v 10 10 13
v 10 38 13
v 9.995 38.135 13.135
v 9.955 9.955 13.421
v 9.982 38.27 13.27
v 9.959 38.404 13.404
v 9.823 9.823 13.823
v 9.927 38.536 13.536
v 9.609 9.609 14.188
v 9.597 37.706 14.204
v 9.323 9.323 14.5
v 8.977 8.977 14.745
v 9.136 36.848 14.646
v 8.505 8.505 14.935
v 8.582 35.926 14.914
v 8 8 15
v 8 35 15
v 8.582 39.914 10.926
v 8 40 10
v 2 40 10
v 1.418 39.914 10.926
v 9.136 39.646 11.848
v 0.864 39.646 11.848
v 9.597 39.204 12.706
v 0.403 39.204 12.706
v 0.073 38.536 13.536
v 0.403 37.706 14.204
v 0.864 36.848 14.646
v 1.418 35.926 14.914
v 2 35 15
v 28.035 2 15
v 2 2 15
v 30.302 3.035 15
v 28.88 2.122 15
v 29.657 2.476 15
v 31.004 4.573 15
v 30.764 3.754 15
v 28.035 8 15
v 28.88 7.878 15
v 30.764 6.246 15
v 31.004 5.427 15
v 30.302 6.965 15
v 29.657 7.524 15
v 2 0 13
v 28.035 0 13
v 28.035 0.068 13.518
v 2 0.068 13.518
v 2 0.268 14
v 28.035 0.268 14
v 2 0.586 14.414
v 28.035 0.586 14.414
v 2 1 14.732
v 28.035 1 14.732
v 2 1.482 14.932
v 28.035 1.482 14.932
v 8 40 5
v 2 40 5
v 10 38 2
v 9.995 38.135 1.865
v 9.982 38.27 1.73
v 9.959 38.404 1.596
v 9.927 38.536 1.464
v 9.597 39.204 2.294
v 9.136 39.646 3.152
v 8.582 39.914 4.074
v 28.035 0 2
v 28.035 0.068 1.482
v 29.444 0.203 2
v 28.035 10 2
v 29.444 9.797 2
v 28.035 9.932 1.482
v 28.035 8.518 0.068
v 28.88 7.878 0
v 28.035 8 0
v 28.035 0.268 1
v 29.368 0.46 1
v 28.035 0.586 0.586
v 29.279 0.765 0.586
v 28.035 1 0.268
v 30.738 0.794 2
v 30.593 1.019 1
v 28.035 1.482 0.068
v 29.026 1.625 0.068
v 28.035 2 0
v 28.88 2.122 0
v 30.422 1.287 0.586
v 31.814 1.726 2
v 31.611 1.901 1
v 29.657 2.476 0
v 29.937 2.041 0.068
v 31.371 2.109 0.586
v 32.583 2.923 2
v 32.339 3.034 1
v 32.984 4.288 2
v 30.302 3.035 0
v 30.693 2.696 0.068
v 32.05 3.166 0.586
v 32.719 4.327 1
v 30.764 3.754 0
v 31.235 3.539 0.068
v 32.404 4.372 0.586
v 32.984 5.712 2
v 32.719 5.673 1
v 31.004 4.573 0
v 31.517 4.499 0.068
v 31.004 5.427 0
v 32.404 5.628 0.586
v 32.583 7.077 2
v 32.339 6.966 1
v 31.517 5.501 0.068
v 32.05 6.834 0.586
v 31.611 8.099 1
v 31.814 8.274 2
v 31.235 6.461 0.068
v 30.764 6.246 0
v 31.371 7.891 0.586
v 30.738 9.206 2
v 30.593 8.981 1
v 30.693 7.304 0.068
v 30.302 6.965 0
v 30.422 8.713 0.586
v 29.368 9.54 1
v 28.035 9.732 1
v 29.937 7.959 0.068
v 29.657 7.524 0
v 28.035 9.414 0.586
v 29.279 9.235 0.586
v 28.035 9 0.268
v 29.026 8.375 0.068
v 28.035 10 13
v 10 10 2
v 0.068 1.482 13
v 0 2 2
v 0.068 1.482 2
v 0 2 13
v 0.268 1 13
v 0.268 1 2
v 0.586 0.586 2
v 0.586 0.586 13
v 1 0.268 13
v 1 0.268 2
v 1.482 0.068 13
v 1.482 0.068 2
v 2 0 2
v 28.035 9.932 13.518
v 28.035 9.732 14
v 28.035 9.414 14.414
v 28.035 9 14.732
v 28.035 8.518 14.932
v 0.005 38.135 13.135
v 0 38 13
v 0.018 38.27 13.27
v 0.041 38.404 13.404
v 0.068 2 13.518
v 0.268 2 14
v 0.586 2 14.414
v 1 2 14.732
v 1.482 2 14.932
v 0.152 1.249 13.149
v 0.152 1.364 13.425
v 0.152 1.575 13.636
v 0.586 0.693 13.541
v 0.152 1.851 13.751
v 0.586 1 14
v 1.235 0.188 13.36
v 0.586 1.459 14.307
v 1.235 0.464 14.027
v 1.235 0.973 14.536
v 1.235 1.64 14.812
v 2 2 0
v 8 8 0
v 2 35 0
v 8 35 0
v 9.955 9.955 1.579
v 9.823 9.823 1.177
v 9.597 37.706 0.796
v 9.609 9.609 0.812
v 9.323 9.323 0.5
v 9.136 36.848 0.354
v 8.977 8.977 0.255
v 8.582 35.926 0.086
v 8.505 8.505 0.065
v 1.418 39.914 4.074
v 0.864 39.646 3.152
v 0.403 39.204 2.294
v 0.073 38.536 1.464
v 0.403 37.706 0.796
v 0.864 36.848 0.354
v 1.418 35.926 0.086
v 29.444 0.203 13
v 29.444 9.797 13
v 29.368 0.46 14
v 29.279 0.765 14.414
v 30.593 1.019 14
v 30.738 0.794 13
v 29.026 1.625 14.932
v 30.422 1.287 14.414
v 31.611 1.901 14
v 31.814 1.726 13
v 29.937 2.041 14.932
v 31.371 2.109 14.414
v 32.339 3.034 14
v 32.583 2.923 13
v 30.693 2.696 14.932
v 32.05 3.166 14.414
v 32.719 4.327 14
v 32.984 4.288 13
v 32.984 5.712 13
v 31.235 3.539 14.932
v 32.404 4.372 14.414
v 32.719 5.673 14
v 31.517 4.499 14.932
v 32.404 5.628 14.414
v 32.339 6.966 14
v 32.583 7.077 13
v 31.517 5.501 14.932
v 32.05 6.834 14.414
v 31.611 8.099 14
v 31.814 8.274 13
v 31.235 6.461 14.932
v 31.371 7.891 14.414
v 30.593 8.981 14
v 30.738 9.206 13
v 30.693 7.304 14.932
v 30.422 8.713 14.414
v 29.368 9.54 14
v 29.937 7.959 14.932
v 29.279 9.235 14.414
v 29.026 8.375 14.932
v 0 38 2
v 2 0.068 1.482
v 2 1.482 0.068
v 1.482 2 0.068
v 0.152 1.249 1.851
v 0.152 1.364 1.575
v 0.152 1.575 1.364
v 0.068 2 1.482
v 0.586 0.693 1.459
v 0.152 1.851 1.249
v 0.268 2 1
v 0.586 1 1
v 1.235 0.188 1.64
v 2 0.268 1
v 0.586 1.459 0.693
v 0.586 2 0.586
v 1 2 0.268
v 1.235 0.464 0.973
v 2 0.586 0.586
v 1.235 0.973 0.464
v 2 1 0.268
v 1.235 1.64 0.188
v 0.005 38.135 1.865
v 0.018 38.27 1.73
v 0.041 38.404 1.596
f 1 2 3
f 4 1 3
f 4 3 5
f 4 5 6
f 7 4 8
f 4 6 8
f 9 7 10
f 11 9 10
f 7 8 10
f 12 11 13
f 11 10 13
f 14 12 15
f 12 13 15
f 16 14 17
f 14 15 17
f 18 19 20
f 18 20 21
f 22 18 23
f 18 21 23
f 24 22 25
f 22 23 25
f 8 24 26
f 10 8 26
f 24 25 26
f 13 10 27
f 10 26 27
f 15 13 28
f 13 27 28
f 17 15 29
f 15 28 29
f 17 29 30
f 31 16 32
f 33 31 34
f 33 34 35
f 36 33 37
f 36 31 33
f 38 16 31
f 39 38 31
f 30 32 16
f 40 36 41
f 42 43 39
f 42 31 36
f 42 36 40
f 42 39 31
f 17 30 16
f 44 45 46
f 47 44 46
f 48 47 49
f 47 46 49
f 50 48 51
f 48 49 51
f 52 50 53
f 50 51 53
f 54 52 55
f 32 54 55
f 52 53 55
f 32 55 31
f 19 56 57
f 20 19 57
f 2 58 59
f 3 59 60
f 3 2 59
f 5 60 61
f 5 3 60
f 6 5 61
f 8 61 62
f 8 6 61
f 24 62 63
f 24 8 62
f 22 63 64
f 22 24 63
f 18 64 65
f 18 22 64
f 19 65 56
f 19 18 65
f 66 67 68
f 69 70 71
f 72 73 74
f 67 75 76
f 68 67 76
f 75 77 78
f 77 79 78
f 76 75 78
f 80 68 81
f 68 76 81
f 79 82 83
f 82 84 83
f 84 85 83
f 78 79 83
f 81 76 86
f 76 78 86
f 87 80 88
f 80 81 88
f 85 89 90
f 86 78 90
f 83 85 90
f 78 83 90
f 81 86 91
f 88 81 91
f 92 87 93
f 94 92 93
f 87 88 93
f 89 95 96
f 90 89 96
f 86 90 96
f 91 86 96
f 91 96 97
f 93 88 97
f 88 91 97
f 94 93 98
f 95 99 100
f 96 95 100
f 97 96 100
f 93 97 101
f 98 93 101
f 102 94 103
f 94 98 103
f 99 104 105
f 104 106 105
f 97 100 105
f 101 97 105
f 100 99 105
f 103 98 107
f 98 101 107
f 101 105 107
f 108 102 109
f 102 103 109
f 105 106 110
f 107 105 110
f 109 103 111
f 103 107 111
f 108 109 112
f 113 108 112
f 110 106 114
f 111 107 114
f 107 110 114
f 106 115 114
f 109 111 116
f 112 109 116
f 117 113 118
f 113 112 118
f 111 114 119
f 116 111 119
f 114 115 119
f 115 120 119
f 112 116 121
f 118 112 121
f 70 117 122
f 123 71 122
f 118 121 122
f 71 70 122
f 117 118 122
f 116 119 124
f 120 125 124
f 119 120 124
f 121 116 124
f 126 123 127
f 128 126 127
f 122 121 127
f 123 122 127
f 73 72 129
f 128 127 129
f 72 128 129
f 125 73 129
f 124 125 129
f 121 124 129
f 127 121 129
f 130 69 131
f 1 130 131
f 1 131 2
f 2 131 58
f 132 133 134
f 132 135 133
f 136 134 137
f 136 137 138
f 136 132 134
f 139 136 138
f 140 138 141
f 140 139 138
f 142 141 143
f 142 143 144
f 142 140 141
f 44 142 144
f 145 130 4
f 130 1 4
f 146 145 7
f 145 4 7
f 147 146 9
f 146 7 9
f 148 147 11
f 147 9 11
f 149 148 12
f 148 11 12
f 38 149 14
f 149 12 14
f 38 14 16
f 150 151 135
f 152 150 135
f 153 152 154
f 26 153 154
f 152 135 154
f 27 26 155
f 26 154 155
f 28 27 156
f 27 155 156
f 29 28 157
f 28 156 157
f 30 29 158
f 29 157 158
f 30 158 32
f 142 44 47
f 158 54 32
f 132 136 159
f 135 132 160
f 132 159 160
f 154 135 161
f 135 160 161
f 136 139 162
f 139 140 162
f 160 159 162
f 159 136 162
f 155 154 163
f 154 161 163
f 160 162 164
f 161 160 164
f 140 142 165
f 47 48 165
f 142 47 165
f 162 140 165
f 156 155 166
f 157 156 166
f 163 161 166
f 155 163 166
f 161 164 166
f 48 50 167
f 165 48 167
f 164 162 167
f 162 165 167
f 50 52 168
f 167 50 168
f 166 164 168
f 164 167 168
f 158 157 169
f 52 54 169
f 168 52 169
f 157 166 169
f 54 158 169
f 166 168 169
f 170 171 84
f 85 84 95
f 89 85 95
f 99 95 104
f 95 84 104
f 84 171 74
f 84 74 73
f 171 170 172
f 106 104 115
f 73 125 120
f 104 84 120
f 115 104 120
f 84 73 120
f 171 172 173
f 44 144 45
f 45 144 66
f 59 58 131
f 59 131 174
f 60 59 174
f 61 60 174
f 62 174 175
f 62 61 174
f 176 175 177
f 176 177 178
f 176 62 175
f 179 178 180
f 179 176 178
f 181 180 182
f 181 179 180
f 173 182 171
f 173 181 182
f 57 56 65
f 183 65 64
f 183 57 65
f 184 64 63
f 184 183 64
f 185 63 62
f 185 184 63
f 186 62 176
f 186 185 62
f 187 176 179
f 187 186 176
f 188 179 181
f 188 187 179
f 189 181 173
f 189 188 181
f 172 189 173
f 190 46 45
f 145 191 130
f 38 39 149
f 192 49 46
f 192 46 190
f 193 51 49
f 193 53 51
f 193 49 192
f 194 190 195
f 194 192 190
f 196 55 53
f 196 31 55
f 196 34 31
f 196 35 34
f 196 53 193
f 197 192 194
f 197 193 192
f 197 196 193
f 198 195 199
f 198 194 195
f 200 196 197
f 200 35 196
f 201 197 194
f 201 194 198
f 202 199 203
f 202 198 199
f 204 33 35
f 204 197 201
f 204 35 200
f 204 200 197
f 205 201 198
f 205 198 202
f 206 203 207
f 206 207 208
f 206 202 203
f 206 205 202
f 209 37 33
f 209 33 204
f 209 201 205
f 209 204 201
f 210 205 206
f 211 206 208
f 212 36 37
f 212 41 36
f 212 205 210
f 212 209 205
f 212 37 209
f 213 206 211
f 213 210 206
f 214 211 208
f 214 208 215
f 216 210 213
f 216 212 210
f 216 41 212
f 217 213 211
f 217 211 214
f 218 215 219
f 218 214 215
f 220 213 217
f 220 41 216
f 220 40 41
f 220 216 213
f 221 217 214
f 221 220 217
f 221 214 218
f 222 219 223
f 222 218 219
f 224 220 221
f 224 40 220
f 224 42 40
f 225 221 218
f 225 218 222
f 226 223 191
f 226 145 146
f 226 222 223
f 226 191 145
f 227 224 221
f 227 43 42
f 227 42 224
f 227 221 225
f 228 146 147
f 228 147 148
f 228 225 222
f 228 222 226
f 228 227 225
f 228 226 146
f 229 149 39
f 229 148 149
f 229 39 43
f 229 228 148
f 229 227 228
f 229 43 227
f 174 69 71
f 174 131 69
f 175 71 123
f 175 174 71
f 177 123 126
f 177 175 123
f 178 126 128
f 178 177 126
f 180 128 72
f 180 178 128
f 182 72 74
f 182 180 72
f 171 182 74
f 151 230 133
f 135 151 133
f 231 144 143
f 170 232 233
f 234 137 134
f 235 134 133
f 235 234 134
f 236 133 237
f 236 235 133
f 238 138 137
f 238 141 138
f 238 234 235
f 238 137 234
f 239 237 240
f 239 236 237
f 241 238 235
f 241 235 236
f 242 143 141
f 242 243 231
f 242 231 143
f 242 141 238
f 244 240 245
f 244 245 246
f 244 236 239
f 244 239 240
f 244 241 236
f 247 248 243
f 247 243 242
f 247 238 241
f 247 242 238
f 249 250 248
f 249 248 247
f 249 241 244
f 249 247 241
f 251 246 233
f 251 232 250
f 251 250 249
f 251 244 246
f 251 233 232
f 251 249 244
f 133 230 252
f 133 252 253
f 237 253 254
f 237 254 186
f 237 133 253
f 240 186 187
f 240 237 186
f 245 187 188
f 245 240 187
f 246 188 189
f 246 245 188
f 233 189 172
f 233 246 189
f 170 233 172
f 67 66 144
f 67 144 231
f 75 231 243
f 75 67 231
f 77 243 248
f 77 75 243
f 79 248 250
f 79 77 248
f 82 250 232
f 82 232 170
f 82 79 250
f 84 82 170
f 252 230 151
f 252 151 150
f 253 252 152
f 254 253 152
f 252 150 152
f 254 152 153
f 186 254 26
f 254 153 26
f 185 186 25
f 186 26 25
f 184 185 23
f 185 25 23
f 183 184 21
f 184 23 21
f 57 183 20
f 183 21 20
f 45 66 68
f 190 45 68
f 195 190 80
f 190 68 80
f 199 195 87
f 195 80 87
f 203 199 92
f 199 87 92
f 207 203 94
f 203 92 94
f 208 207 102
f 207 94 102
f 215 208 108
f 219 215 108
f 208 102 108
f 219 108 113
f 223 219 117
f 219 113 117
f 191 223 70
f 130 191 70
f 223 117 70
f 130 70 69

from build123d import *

# Parameters (mm, degrees)
F1_DEPTH    = 15
F2_R        = 2
F3_T1_DEPTH = 31


# Not quite as in the source:
# - a fillet or chamfer that OpenCascade refuses, or shapes differently, is made with other operations: its cross-section is extruded or revolved along the edge and cut away or added


with BuildPart() as f1:
    # F0 (on Top) → F1 (new body)
    with BuildSketch(Plane.XY):
        Polygon((0, 40), (0, 0), (28.0349999666, 0), (28.0349999666, 10), (10, 10), (10, 40), align=None)
        with BuildLine():
            Line((28.0349999666, 10), (28.0349999666, 0))
            ThreePointArc((28.0349999666, 0), (33.0349999666, 5), (28.0349999666, 10))
        make_face()
    extrude(amount=F1_DEPTH)

    # F2
    f2_edges = [f1.edges().sort_by_distance(p)[0] for p in [
        (10, 25, 15),
        (19.0175, 10, 15),
        (14.0175, 0, 0),
        (10, 40, 7.5),
        (0, 40, 7.5),
        (0, 0, 7.5),
        (0, 20, 0),
        (0, 20, 15),
        (10, 25, 0),
        (14.0175, 0, 15),
        (33.035, 5, 0),
        (33.035, 5, 15),
        (19.0175, 10, 0),
    ]]
    fillet(f2_edges, radius=F2_R)

    # F3: fillet of radius 5 on 4 edges, made by hand

    # F3_s2 → F3_t1 (cut)
    with BuildSketch(Plane.YZ.offset(-10.5)):
        with BuildLine():
            ThreePointArc((40, 5), (38.5355339059, 1.4644660941), (35, 0))
            Line((35, 0), (40, 0))
            Line((40, 0), (40, 5))
        make_face()
        with BuildLine():
            ThreePointArc((40, 10), (38.5355339059, 13.5355339059), (35, 15))
            Line((35, 15), (40, 15))
            Line((40, 15), (40, 10))
        make_face()
    extrude(amount=F3_T1_DEPTH, mode=Mode.SUBTRACT)


solid = f1.part
